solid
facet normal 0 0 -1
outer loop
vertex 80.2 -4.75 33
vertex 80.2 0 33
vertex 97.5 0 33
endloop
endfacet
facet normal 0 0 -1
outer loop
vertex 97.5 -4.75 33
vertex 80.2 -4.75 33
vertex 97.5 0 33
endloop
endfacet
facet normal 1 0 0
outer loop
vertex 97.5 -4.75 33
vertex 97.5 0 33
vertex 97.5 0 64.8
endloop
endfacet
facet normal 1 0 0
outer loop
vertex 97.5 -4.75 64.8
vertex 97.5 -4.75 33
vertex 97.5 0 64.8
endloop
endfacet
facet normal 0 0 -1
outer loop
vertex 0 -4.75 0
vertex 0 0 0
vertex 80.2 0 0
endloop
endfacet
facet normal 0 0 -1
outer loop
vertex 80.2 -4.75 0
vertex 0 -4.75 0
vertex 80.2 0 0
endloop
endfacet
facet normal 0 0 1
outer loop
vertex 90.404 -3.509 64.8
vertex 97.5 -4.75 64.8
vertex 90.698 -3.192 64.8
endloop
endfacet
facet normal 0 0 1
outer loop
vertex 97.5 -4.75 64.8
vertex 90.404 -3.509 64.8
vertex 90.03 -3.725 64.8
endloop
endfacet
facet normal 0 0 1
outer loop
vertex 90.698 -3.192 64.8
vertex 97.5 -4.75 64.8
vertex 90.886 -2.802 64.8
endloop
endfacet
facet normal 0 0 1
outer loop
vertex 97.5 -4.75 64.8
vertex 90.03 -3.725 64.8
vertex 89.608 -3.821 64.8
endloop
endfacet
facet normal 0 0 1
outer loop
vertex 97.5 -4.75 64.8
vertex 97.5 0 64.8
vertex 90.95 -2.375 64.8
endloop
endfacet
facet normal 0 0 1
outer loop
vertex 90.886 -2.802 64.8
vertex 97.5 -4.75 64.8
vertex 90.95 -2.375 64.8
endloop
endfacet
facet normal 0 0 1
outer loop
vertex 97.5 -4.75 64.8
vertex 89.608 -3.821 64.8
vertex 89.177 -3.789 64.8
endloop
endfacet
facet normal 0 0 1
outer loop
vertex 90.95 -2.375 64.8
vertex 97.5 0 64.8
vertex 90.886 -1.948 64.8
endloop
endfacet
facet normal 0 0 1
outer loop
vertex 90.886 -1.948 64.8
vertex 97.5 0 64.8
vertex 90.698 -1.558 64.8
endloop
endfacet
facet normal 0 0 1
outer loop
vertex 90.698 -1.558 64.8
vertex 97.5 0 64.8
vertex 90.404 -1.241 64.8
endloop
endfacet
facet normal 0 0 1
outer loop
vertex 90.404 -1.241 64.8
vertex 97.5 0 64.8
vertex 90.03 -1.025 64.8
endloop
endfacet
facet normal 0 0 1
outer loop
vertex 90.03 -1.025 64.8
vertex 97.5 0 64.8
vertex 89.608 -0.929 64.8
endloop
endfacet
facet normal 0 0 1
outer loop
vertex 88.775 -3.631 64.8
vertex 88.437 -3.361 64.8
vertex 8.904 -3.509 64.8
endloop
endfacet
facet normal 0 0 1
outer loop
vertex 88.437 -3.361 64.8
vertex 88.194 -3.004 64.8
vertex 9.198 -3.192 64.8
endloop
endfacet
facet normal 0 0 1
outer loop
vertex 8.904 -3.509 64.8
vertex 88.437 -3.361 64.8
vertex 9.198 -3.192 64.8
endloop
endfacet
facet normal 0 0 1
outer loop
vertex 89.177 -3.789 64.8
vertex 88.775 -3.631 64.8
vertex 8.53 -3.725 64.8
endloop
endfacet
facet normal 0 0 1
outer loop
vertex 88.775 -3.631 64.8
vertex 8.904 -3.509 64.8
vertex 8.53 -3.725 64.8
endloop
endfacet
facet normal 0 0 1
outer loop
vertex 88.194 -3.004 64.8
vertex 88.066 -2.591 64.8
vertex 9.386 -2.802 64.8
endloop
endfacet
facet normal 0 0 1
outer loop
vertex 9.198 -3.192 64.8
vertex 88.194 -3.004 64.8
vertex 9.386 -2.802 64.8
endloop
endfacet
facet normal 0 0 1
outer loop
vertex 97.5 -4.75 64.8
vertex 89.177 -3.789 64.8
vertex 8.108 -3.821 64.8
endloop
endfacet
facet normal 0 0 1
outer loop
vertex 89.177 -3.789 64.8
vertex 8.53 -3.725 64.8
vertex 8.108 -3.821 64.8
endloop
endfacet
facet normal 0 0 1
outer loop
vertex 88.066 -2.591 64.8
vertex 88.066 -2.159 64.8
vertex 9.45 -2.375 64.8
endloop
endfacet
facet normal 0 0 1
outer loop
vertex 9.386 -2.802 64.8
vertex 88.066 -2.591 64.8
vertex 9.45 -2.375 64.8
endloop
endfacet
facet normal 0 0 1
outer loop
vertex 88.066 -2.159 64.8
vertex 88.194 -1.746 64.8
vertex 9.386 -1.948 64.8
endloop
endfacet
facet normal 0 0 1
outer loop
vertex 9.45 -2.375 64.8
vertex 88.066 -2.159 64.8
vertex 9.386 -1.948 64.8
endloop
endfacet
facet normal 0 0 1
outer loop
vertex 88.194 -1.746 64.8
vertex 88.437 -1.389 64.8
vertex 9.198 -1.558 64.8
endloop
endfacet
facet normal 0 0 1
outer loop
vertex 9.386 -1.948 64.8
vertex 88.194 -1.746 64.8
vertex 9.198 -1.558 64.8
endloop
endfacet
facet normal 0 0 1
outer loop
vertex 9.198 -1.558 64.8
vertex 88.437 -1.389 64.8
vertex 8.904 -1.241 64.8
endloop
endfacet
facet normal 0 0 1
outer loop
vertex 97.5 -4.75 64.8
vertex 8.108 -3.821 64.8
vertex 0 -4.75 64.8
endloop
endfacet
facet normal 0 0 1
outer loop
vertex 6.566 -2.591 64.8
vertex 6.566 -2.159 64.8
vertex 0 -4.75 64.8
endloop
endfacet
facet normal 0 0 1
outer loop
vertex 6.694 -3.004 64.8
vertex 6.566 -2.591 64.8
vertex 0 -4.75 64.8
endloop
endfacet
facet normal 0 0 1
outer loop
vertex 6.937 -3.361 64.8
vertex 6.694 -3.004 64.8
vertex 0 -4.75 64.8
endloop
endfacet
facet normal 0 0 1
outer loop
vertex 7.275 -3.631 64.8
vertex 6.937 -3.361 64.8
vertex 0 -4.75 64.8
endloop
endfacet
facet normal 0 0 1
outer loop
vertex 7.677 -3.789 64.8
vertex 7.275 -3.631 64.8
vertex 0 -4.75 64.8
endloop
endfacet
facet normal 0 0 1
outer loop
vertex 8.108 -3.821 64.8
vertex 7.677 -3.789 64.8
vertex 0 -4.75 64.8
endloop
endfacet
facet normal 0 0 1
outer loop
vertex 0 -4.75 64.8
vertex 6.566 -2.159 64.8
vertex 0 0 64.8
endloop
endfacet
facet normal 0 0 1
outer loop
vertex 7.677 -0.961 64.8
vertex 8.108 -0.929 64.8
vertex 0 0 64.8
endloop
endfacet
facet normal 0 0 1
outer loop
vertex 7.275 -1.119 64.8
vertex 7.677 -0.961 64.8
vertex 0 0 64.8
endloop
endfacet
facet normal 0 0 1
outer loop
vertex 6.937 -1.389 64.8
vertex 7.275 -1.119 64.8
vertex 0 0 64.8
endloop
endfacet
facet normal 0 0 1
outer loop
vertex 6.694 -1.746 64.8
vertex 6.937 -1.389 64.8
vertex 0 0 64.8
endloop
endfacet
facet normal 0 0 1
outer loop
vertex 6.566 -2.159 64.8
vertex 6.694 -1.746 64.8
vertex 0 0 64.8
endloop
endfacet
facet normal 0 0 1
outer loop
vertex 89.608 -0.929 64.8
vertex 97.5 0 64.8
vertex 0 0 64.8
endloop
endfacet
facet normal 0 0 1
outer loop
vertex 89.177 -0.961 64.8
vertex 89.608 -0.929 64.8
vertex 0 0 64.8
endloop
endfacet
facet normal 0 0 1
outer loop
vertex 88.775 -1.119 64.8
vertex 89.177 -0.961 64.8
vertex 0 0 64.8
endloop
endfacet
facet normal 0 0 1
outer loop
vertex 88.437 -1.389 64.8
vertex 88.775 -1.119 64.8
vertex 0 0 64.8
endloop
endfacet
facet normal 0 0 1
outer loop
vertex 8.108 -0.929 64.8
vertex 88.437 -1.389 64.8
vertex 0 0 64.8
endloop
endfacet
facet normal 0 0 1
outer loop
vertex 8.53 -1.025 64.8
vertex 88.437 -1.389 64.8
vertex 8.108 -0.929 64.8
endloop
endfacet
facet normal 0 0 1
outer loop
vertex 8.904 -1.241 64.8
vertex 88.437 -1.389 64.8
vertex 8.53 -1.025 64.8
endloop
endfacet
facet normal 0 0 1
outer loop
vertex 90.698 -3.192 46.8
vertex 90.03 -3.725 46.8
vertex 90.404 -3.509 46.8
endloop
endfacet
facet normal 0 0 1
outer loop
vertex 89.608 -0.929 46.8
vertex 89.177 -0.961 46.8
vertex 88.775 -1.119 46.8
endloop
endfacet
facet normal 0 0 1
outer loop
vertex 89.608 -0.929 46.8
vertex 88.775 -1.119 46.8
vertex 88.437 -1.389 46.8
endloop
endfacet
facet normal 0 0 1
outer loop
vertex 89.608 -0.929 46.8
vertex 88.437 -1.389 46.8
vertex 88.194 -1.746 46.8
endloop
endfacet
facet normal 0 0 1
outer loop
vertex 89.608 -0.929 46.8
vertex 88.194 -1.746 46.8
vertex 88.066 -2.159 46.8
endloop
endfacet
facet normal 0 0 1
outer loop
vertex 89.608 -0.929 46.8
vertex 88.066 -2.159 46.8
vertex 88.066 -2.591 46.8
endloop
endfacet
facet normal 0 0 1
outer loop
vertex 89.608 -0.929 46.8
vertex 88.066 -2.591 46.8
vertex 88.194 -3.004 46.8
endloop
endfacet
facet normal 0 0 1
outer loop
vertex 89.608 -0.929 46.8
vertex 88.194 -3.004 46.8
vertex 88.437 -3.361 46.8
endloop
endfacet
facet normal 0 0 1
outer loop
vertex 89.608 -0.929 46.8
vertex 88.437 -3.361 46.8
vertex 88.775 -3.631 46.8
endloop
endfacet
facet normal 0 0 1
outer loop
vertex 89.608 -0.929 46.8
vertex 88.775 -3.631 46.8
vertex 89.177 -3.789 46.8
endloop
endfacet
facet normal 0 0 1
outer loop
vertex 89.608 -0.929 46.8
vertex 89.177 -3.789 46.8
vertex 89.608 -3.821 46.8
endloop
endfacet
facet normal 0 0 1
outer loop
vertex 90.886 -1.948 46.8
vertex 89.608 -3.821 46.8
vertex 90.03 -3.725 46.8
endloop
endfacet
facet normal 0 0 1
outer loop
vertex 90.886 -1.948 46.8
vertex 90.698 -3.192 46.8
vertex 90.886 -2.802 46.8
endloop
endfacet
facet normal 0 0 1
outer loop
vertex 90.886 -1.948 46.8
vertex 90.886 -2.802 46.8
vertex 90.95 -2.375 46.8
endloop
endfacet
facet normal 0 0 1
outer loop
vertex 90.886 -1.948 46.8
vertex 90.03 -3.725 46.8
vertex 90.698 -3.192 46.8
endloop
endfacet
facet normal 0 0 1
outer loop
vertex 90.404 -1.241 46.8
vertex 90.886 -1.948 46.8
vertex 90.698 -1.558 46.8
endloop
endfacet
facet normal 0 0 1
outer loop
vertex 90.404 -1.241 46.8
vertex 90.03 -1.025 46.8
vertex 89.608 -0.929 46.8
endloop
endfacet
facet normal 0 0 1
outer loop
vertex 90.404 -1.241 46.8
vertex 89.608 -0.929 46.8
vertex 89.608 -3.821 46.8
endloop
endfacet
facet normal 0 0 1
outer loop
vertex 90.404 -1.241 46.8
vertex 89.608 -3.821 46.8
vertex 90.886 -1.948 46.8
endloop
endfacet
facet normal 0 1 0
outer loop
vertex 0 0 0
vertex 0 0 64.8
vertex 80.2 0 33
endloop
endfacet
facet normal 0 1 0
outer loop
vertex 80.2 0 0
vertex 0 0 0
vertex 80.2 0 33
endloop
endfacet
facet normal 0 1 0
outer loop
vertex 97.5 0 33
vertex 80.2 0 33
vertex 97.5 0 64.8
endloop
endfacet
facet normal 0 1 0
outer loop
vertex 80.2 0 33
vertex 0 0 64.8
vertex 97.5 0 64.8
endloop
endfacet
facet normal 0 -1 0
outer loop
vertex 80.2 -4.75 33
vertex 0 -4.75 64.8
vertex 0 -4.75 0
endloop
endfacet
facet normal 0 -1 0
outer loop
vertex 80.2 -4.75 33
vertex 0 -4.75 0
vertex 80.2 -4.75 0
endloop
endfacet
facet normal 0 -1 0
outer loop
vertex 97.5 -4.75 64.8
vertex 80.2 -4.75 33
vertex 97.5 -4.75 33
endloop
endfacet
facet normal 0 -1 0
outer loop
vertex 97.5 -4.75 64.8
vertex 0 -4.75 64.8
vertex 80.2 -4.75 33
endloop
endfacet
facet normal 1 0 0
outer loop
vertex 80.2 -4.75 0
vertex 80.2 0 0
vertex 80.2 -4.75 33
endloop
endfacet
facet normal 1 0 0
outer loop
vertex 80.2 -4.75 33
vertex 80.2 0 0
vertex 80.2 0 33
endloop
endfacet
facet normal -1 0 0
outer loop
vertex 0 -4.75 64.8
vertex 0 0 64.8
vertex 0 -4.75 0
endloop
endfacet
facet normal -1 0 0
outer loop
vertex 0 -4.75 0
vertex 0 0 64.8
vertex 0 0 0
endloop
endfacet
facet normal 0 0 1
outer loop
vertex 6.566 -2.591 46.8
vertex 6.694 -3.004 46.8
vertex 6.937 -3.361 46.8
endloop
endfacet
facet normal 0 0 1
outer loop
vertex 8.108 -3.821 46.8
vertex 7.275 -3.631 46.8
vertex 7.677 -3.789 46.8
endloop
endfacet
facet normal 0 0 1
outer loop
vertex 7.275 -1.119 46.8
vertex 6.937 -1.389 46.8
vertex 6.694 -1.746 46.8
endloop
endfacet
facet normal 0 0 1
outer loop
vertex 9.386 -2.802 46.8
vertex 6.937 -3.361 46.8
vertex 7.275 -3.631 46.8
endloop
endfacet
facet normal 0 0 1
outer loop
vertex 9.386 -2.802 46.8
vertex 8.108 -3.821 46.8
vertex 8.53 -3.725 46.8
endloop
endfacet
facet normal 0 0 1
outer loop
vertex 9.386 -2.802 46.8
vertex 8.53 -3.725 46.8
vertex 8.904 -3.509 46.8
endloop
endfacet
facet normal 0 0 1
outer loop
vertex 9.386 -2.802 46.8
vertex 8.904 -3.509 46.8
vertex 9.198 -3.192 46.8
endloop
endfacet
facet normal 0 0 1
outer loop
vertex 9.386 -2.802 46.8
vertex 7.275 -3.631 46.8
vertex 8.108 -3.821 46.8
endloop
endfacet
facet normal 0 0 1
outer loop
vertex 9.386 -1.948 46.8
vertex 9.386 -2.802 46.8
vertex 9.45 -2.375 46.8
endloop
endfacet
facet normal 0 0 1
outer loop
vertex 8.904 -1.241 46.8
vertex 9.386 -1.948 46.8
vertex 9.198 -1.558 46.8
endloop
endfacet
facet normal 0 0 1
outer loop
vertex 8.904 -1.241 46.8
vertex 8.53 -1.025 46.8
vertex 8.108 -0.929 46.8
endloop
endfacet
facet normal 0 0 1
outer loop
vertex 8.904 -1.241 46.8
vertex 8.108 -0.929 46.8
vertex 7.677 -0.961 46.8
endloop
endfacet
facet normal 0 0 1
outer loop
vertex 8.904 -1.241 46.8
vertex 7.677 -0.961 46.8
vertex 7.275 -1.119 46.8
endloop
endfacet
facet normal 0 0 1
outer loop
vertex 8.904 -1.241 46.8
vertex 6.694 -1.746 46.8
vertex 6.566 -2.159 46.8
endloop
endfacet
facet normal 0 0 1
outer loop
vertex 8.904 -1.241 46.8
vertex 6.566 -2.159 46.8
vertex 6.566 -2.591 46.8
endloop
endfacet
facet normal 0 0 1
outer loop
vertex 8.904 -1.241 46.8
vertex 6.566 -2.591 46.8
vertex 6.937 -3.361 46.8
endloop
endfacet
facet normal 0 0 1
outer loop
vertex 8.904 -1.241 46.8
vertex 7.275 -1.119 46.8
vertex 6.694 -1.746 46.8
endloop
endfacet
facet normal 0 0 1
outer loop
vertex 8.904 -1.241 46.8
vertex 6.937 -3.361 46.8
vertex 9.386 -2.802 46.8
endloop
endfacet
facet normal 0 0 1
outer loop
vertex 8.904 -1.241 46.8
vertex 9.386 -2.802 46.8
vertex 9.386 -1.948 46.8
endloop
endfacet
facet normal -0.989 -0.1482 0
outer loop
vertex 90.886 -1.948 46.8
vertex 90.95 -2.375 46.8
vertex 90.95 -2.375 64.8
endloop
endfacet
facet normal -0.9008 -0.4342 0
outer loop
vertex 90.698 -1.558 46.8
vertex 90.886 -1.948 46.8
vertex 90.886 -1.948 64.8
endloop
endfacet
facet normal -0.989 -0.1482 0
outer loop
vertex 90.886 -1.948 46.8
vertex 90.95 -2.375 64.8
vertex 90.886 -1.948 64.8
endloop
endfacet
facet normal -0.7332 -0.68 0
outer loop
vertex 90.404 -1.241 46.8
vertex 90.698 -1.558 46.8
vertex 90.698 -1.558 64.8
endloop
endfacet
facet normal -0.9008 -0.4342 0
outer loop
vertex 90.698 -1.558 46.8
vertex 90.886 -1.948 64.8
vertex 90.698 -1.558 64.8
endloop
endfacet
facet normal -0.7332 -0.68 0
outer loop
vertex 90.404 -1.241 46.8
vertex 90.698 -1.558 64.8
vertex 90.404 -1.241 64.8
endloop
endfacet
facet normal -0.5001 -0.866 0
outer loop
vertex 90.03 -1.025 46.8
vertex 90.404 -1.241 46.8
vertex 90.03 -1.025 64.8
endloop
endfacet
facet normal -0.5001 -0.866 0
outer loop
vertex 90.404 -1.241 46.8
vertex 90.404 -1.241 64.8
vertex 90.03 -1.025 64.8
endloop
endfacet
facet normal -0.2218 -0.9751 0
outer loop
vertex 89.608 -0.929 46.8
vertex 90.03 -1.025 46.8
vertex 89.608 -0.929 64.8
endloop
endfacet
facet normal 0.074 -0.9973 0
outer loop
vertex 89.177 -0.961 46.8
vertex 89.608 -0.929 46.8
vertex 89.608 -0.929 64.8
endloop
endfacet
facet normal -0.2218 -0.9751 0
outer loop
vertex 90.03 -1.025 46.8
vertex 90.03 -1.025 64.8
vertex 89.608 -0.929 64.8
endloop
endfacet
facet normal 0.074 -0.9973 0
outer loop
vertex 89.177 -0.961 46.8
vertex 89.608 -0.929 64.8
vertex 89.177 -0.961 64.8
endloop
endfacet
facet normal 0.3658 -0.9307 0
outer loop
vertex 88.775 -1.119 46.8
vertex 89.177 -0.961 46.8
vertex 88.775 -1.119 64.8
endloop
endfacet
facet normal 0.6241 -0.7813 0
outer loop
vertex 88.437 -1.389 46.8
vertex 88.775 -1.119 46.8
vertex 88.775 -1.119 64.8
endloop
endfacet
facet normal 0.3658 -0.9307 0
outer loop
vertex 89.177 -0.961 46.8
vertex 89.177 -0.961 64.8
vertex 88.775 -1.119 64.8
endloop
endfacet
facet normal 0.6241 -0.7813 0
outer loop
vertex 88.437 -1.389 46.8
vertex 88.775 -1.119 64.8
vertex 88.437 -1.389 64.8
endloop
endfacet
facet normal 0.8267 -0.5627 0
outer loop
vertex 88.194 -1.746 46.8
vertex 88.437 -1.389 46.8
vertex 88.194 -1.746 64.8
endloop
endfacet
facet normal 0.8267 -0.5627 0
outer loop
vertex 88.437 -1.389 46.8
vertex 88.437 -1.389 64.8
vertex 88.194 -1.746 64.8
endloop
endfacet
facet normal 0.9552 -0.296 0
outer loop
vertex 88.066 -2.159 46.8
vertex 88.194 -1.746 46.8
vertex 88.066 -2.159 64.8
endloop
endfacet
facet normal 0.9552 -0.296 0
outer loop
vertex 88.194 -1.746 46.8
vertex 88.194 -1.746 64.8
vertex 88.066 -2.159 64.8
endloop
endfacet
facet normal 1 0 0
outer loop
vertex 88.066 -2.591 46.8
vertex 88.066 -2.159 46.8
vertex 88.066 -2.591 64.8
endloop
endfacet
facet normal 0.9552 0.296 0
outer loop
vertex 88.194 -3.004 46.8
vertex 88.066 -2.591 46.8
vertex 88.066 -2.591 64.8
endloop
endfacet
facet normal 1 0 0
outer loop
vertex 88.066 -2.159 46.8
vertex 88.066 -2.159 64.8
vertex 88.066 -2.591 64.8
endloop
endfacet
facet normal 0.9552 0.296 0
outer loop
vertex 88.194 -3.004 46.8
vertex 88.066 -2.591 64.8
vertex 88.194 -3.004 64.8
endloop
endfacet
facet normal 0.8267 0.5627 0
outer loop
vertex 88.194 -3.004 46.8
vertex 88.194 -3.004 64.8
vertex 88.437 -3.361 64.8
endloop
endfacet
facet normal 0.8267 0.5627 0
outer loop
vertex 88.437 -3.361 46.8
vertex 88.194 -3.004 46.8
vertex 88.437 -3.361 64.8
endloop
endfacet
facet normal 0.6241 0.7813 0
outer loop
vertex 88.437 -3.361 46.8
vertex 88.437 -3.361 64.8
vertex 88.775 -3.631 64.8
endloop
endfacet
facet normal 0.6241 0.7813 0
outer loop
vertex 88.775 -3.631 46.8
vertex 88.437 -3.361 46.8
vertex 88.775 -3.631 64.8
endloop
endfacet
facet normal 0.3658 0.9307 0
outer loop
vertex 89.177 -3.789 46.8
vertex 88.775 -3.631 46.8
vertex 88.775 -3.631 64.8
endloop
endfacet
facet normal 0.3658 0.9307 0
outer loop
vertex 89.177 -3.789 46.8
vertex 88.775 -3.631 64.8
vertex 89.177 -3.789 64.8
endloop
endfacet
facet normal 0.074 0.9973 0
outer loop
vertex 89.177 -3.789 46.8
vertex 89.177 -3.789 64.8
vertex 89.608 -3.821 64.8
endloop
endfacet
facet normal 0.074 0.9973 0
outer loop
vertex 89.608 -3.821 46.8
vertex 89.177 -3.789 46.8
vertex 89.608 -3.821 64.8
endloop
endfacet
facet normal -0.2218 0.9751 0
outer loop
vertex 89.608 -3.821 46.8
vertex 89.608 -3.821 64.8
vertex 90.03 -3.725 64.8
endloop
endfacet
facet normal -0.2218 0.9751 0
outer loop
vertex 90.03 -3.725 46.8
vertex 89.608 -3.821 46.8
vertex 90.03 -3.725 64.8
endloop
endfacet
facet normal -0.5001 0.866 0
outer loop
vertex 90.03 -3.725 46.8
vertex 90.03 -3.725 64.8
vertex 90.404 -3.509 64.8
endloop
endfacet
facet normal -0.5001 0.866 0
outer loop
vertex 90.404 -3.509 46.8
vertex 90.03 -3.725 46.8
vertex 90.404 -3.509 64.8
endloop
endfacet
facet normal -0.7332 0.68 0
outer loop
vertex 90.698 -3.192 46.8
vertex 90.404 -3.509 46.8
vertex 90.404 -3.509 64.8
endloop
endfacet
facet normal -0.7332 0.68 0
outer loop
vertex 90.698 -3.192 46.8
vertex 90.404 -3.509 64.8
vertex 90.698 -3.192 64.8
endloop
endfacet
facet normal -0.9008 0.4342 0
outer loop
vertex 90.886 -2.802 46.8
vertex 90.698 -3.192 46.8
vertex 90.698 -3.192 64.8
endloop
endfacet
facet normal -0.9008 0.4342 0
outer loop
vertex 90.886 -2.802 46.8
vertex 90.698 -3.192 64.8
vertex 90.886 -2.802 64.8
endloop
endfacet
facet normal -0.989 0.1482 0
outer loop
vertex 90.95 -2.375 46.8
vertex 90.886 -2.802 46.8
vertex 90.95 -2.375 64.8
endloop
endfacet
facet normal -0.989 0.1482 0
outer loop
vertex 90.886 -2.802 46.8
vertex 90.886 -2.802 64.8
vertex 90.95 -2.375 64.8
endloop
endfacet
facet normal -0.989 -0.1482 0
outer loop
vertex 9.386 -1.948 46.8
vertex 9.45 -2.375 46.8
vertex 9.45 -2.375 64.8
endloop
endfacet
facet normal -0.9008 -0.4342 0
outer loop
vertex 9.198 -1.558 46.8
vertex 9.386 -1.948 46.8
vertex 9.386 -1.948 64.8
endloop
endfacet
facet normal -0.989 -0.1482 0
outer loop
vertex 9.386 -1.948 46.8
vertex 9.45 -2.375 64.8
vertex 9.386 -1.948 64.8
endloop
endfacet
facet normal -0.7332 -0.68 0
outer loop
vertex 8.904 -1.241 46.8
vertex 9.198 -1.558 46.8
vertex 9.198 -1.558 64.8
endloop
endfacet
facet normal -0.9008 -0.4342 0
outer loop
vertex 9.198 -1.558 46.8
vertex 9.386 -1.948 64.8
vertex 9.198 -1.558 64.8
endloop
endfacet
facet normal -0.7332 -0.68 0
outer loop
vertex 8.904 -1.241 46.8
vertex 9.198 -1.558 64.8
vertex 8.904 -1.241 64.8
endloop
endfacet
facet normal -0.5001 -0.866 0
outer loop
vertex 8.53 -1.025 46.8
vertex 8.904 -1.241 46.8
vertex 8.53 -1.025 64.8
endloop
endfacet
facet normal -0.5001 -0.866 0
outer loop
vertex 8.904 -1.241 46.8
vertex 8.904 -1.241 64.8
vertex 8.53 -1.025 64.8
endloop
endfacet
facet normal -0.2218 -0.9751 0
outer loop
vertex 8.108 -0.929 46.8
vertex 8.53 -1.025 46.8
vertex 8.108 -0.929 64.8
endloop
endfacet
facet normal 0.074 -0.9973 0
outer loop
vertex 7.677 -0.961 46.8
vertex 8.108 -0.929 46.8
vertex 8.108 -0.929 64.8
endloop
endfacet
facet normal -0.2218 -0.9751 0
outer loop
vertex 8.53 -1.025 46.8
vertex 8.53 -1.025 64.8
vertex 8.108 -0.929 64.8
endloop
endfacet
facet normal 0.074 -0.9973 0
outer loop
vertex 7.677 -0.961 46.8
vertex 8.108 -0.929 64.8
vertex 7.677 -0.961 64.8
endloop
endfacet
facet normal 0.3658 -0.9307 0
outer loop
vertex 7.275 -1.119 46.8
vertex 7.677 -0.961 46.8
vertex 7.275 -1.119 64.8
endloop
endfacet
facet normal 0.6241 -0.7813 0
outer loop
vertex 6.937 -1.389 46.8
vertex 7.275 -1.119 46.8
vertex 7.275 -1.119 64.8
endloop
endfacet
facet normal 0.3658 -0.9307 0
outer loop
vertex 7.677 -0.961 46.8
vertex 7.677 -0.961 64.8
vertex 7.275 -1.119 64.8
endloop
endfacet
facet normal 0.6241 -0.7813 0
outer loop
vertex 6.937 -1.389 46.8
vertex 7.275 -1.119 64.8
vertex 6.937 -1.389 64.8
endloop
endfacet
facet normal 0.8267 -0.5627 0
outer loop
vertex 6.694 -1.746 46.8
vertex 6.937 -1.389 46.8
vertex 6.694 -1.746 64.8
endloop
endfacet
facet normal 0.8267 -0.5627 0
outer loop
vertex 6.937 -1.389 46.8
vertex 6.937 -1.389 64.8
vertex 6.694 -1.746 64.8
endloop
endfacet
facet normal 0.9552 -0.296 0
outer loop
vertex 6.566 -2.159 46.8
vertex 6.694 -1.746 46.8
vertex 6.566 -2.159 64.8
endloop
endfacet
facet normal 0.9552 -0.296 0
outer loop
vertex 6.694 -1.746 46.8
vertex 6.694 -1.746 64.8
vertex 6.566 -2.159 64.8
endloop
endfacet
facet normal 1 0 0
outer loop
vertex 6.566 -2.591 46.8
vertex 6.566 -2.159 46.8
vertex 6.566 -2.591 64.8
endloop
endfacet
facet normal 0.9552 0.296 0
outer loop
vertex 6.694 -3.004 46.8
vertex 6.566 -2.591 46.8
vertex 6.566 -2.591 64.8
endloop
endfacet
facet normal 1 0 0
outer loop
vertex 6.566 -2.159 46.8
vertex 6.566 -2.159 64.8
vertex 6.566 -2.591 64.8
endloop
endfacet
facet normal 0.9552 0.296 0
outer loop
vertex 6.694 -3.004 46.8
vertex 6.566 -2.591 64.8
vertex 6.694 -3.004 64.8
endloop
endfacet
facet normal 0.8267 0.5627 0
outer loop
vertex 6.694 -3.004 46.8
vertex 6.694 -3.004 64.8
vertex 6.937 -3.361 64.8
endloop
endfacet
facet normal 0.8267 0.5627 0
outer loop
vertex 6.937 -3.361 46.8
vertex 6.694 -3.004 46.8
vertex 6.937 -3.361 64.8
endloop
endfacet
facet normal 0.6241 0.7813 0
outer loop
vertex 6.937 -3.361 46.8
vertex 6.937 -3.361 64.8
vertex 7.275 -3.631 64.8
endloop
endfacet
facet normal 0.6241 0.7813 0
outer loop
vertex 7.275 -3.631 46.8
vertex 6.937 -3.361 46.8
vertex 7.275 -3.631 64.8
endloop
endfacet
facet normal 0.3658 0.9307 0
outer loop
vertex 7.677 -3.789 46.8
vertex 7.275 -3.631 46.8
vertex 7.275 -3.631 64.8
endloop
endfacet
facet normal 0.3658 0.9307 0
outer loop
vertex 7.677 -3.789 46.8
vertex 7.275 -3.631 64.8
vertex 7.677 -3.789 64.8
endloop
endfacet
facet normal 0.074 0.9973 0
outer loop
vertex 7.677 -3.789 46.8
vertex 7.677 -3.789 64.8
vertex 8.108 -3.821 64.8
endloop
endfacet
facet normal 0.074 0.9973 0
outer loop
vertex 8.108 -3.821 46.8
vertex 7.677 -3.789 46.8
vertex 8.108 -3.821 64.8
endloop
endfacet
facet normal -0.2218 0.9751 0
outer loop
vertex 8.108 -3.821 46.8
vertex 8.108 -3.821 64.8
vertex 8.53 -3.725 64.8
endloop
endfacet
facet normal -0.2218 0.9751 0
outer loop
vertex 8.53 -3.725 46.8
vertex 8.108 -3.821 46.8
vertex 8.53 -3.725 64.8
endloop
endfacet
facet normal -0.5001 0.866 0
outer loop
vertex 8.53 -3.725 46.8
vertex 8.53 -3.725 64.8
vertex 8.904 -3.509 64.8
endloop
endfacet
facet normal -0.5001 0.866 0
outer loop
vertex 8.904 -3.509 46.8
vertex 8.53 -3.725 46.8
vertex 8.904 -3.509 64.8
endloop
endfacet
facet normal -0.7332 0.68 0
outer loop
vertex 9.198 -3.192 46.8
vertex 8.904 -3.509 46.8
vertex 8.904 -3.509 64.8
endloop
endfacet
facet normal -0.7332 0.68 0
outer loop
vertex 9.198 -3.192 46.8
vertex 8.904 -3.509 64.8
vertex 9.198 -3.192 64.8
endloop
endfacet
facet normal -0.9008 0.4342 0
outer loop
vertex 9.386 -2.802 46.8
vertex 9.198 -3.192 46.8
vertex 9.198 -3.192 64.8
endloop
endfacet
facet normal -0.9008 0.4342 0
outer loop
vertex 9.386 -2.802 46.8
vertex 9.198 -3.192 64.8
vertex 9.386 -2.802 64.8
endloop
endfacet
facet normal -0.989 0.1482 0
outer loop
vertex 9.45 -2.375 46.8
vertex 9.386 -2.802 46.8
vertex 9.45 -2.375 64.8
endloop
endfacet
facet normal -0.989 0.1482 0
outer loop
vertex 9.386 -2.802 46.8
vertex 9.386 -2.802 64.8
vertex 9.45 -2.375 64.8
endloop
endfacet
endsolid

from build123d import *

# Parameters (mm, degrees)
F1_DEPTH = 4.75
F2_R     = 1.45
F3_DEPTH = 18


with BuildPart() as f1:
    # F0 (on Front) → F1 (new body)
    with BuildSketch(Plane.XZ):
        Polygon((0, 64.8), (0, 0), (80.2, 0), (80.2, 33), (97.5, 33), (97.5, 64.8), align=None)
    extrude(amount=F1_DEPTH)

    # F2 (on face) → F3 (cut)
    with BuildSketch(Plane.XY.offset(64.8)):
        with Locations((89.5, -2.375)):
            Circle(F2_R)
        with BuildLine():
            ThreePointArc((6.55, -2.375), (8, -3.825), (9.45, -2.375))
            ThreePointArc((9.45, -2.375), (8, -0.925), (6.55, -2.375))
        make_face()
    extrude(amount=-F3_DEPTH, mode=Mode.SUBTRACT)


solid = f1.part
